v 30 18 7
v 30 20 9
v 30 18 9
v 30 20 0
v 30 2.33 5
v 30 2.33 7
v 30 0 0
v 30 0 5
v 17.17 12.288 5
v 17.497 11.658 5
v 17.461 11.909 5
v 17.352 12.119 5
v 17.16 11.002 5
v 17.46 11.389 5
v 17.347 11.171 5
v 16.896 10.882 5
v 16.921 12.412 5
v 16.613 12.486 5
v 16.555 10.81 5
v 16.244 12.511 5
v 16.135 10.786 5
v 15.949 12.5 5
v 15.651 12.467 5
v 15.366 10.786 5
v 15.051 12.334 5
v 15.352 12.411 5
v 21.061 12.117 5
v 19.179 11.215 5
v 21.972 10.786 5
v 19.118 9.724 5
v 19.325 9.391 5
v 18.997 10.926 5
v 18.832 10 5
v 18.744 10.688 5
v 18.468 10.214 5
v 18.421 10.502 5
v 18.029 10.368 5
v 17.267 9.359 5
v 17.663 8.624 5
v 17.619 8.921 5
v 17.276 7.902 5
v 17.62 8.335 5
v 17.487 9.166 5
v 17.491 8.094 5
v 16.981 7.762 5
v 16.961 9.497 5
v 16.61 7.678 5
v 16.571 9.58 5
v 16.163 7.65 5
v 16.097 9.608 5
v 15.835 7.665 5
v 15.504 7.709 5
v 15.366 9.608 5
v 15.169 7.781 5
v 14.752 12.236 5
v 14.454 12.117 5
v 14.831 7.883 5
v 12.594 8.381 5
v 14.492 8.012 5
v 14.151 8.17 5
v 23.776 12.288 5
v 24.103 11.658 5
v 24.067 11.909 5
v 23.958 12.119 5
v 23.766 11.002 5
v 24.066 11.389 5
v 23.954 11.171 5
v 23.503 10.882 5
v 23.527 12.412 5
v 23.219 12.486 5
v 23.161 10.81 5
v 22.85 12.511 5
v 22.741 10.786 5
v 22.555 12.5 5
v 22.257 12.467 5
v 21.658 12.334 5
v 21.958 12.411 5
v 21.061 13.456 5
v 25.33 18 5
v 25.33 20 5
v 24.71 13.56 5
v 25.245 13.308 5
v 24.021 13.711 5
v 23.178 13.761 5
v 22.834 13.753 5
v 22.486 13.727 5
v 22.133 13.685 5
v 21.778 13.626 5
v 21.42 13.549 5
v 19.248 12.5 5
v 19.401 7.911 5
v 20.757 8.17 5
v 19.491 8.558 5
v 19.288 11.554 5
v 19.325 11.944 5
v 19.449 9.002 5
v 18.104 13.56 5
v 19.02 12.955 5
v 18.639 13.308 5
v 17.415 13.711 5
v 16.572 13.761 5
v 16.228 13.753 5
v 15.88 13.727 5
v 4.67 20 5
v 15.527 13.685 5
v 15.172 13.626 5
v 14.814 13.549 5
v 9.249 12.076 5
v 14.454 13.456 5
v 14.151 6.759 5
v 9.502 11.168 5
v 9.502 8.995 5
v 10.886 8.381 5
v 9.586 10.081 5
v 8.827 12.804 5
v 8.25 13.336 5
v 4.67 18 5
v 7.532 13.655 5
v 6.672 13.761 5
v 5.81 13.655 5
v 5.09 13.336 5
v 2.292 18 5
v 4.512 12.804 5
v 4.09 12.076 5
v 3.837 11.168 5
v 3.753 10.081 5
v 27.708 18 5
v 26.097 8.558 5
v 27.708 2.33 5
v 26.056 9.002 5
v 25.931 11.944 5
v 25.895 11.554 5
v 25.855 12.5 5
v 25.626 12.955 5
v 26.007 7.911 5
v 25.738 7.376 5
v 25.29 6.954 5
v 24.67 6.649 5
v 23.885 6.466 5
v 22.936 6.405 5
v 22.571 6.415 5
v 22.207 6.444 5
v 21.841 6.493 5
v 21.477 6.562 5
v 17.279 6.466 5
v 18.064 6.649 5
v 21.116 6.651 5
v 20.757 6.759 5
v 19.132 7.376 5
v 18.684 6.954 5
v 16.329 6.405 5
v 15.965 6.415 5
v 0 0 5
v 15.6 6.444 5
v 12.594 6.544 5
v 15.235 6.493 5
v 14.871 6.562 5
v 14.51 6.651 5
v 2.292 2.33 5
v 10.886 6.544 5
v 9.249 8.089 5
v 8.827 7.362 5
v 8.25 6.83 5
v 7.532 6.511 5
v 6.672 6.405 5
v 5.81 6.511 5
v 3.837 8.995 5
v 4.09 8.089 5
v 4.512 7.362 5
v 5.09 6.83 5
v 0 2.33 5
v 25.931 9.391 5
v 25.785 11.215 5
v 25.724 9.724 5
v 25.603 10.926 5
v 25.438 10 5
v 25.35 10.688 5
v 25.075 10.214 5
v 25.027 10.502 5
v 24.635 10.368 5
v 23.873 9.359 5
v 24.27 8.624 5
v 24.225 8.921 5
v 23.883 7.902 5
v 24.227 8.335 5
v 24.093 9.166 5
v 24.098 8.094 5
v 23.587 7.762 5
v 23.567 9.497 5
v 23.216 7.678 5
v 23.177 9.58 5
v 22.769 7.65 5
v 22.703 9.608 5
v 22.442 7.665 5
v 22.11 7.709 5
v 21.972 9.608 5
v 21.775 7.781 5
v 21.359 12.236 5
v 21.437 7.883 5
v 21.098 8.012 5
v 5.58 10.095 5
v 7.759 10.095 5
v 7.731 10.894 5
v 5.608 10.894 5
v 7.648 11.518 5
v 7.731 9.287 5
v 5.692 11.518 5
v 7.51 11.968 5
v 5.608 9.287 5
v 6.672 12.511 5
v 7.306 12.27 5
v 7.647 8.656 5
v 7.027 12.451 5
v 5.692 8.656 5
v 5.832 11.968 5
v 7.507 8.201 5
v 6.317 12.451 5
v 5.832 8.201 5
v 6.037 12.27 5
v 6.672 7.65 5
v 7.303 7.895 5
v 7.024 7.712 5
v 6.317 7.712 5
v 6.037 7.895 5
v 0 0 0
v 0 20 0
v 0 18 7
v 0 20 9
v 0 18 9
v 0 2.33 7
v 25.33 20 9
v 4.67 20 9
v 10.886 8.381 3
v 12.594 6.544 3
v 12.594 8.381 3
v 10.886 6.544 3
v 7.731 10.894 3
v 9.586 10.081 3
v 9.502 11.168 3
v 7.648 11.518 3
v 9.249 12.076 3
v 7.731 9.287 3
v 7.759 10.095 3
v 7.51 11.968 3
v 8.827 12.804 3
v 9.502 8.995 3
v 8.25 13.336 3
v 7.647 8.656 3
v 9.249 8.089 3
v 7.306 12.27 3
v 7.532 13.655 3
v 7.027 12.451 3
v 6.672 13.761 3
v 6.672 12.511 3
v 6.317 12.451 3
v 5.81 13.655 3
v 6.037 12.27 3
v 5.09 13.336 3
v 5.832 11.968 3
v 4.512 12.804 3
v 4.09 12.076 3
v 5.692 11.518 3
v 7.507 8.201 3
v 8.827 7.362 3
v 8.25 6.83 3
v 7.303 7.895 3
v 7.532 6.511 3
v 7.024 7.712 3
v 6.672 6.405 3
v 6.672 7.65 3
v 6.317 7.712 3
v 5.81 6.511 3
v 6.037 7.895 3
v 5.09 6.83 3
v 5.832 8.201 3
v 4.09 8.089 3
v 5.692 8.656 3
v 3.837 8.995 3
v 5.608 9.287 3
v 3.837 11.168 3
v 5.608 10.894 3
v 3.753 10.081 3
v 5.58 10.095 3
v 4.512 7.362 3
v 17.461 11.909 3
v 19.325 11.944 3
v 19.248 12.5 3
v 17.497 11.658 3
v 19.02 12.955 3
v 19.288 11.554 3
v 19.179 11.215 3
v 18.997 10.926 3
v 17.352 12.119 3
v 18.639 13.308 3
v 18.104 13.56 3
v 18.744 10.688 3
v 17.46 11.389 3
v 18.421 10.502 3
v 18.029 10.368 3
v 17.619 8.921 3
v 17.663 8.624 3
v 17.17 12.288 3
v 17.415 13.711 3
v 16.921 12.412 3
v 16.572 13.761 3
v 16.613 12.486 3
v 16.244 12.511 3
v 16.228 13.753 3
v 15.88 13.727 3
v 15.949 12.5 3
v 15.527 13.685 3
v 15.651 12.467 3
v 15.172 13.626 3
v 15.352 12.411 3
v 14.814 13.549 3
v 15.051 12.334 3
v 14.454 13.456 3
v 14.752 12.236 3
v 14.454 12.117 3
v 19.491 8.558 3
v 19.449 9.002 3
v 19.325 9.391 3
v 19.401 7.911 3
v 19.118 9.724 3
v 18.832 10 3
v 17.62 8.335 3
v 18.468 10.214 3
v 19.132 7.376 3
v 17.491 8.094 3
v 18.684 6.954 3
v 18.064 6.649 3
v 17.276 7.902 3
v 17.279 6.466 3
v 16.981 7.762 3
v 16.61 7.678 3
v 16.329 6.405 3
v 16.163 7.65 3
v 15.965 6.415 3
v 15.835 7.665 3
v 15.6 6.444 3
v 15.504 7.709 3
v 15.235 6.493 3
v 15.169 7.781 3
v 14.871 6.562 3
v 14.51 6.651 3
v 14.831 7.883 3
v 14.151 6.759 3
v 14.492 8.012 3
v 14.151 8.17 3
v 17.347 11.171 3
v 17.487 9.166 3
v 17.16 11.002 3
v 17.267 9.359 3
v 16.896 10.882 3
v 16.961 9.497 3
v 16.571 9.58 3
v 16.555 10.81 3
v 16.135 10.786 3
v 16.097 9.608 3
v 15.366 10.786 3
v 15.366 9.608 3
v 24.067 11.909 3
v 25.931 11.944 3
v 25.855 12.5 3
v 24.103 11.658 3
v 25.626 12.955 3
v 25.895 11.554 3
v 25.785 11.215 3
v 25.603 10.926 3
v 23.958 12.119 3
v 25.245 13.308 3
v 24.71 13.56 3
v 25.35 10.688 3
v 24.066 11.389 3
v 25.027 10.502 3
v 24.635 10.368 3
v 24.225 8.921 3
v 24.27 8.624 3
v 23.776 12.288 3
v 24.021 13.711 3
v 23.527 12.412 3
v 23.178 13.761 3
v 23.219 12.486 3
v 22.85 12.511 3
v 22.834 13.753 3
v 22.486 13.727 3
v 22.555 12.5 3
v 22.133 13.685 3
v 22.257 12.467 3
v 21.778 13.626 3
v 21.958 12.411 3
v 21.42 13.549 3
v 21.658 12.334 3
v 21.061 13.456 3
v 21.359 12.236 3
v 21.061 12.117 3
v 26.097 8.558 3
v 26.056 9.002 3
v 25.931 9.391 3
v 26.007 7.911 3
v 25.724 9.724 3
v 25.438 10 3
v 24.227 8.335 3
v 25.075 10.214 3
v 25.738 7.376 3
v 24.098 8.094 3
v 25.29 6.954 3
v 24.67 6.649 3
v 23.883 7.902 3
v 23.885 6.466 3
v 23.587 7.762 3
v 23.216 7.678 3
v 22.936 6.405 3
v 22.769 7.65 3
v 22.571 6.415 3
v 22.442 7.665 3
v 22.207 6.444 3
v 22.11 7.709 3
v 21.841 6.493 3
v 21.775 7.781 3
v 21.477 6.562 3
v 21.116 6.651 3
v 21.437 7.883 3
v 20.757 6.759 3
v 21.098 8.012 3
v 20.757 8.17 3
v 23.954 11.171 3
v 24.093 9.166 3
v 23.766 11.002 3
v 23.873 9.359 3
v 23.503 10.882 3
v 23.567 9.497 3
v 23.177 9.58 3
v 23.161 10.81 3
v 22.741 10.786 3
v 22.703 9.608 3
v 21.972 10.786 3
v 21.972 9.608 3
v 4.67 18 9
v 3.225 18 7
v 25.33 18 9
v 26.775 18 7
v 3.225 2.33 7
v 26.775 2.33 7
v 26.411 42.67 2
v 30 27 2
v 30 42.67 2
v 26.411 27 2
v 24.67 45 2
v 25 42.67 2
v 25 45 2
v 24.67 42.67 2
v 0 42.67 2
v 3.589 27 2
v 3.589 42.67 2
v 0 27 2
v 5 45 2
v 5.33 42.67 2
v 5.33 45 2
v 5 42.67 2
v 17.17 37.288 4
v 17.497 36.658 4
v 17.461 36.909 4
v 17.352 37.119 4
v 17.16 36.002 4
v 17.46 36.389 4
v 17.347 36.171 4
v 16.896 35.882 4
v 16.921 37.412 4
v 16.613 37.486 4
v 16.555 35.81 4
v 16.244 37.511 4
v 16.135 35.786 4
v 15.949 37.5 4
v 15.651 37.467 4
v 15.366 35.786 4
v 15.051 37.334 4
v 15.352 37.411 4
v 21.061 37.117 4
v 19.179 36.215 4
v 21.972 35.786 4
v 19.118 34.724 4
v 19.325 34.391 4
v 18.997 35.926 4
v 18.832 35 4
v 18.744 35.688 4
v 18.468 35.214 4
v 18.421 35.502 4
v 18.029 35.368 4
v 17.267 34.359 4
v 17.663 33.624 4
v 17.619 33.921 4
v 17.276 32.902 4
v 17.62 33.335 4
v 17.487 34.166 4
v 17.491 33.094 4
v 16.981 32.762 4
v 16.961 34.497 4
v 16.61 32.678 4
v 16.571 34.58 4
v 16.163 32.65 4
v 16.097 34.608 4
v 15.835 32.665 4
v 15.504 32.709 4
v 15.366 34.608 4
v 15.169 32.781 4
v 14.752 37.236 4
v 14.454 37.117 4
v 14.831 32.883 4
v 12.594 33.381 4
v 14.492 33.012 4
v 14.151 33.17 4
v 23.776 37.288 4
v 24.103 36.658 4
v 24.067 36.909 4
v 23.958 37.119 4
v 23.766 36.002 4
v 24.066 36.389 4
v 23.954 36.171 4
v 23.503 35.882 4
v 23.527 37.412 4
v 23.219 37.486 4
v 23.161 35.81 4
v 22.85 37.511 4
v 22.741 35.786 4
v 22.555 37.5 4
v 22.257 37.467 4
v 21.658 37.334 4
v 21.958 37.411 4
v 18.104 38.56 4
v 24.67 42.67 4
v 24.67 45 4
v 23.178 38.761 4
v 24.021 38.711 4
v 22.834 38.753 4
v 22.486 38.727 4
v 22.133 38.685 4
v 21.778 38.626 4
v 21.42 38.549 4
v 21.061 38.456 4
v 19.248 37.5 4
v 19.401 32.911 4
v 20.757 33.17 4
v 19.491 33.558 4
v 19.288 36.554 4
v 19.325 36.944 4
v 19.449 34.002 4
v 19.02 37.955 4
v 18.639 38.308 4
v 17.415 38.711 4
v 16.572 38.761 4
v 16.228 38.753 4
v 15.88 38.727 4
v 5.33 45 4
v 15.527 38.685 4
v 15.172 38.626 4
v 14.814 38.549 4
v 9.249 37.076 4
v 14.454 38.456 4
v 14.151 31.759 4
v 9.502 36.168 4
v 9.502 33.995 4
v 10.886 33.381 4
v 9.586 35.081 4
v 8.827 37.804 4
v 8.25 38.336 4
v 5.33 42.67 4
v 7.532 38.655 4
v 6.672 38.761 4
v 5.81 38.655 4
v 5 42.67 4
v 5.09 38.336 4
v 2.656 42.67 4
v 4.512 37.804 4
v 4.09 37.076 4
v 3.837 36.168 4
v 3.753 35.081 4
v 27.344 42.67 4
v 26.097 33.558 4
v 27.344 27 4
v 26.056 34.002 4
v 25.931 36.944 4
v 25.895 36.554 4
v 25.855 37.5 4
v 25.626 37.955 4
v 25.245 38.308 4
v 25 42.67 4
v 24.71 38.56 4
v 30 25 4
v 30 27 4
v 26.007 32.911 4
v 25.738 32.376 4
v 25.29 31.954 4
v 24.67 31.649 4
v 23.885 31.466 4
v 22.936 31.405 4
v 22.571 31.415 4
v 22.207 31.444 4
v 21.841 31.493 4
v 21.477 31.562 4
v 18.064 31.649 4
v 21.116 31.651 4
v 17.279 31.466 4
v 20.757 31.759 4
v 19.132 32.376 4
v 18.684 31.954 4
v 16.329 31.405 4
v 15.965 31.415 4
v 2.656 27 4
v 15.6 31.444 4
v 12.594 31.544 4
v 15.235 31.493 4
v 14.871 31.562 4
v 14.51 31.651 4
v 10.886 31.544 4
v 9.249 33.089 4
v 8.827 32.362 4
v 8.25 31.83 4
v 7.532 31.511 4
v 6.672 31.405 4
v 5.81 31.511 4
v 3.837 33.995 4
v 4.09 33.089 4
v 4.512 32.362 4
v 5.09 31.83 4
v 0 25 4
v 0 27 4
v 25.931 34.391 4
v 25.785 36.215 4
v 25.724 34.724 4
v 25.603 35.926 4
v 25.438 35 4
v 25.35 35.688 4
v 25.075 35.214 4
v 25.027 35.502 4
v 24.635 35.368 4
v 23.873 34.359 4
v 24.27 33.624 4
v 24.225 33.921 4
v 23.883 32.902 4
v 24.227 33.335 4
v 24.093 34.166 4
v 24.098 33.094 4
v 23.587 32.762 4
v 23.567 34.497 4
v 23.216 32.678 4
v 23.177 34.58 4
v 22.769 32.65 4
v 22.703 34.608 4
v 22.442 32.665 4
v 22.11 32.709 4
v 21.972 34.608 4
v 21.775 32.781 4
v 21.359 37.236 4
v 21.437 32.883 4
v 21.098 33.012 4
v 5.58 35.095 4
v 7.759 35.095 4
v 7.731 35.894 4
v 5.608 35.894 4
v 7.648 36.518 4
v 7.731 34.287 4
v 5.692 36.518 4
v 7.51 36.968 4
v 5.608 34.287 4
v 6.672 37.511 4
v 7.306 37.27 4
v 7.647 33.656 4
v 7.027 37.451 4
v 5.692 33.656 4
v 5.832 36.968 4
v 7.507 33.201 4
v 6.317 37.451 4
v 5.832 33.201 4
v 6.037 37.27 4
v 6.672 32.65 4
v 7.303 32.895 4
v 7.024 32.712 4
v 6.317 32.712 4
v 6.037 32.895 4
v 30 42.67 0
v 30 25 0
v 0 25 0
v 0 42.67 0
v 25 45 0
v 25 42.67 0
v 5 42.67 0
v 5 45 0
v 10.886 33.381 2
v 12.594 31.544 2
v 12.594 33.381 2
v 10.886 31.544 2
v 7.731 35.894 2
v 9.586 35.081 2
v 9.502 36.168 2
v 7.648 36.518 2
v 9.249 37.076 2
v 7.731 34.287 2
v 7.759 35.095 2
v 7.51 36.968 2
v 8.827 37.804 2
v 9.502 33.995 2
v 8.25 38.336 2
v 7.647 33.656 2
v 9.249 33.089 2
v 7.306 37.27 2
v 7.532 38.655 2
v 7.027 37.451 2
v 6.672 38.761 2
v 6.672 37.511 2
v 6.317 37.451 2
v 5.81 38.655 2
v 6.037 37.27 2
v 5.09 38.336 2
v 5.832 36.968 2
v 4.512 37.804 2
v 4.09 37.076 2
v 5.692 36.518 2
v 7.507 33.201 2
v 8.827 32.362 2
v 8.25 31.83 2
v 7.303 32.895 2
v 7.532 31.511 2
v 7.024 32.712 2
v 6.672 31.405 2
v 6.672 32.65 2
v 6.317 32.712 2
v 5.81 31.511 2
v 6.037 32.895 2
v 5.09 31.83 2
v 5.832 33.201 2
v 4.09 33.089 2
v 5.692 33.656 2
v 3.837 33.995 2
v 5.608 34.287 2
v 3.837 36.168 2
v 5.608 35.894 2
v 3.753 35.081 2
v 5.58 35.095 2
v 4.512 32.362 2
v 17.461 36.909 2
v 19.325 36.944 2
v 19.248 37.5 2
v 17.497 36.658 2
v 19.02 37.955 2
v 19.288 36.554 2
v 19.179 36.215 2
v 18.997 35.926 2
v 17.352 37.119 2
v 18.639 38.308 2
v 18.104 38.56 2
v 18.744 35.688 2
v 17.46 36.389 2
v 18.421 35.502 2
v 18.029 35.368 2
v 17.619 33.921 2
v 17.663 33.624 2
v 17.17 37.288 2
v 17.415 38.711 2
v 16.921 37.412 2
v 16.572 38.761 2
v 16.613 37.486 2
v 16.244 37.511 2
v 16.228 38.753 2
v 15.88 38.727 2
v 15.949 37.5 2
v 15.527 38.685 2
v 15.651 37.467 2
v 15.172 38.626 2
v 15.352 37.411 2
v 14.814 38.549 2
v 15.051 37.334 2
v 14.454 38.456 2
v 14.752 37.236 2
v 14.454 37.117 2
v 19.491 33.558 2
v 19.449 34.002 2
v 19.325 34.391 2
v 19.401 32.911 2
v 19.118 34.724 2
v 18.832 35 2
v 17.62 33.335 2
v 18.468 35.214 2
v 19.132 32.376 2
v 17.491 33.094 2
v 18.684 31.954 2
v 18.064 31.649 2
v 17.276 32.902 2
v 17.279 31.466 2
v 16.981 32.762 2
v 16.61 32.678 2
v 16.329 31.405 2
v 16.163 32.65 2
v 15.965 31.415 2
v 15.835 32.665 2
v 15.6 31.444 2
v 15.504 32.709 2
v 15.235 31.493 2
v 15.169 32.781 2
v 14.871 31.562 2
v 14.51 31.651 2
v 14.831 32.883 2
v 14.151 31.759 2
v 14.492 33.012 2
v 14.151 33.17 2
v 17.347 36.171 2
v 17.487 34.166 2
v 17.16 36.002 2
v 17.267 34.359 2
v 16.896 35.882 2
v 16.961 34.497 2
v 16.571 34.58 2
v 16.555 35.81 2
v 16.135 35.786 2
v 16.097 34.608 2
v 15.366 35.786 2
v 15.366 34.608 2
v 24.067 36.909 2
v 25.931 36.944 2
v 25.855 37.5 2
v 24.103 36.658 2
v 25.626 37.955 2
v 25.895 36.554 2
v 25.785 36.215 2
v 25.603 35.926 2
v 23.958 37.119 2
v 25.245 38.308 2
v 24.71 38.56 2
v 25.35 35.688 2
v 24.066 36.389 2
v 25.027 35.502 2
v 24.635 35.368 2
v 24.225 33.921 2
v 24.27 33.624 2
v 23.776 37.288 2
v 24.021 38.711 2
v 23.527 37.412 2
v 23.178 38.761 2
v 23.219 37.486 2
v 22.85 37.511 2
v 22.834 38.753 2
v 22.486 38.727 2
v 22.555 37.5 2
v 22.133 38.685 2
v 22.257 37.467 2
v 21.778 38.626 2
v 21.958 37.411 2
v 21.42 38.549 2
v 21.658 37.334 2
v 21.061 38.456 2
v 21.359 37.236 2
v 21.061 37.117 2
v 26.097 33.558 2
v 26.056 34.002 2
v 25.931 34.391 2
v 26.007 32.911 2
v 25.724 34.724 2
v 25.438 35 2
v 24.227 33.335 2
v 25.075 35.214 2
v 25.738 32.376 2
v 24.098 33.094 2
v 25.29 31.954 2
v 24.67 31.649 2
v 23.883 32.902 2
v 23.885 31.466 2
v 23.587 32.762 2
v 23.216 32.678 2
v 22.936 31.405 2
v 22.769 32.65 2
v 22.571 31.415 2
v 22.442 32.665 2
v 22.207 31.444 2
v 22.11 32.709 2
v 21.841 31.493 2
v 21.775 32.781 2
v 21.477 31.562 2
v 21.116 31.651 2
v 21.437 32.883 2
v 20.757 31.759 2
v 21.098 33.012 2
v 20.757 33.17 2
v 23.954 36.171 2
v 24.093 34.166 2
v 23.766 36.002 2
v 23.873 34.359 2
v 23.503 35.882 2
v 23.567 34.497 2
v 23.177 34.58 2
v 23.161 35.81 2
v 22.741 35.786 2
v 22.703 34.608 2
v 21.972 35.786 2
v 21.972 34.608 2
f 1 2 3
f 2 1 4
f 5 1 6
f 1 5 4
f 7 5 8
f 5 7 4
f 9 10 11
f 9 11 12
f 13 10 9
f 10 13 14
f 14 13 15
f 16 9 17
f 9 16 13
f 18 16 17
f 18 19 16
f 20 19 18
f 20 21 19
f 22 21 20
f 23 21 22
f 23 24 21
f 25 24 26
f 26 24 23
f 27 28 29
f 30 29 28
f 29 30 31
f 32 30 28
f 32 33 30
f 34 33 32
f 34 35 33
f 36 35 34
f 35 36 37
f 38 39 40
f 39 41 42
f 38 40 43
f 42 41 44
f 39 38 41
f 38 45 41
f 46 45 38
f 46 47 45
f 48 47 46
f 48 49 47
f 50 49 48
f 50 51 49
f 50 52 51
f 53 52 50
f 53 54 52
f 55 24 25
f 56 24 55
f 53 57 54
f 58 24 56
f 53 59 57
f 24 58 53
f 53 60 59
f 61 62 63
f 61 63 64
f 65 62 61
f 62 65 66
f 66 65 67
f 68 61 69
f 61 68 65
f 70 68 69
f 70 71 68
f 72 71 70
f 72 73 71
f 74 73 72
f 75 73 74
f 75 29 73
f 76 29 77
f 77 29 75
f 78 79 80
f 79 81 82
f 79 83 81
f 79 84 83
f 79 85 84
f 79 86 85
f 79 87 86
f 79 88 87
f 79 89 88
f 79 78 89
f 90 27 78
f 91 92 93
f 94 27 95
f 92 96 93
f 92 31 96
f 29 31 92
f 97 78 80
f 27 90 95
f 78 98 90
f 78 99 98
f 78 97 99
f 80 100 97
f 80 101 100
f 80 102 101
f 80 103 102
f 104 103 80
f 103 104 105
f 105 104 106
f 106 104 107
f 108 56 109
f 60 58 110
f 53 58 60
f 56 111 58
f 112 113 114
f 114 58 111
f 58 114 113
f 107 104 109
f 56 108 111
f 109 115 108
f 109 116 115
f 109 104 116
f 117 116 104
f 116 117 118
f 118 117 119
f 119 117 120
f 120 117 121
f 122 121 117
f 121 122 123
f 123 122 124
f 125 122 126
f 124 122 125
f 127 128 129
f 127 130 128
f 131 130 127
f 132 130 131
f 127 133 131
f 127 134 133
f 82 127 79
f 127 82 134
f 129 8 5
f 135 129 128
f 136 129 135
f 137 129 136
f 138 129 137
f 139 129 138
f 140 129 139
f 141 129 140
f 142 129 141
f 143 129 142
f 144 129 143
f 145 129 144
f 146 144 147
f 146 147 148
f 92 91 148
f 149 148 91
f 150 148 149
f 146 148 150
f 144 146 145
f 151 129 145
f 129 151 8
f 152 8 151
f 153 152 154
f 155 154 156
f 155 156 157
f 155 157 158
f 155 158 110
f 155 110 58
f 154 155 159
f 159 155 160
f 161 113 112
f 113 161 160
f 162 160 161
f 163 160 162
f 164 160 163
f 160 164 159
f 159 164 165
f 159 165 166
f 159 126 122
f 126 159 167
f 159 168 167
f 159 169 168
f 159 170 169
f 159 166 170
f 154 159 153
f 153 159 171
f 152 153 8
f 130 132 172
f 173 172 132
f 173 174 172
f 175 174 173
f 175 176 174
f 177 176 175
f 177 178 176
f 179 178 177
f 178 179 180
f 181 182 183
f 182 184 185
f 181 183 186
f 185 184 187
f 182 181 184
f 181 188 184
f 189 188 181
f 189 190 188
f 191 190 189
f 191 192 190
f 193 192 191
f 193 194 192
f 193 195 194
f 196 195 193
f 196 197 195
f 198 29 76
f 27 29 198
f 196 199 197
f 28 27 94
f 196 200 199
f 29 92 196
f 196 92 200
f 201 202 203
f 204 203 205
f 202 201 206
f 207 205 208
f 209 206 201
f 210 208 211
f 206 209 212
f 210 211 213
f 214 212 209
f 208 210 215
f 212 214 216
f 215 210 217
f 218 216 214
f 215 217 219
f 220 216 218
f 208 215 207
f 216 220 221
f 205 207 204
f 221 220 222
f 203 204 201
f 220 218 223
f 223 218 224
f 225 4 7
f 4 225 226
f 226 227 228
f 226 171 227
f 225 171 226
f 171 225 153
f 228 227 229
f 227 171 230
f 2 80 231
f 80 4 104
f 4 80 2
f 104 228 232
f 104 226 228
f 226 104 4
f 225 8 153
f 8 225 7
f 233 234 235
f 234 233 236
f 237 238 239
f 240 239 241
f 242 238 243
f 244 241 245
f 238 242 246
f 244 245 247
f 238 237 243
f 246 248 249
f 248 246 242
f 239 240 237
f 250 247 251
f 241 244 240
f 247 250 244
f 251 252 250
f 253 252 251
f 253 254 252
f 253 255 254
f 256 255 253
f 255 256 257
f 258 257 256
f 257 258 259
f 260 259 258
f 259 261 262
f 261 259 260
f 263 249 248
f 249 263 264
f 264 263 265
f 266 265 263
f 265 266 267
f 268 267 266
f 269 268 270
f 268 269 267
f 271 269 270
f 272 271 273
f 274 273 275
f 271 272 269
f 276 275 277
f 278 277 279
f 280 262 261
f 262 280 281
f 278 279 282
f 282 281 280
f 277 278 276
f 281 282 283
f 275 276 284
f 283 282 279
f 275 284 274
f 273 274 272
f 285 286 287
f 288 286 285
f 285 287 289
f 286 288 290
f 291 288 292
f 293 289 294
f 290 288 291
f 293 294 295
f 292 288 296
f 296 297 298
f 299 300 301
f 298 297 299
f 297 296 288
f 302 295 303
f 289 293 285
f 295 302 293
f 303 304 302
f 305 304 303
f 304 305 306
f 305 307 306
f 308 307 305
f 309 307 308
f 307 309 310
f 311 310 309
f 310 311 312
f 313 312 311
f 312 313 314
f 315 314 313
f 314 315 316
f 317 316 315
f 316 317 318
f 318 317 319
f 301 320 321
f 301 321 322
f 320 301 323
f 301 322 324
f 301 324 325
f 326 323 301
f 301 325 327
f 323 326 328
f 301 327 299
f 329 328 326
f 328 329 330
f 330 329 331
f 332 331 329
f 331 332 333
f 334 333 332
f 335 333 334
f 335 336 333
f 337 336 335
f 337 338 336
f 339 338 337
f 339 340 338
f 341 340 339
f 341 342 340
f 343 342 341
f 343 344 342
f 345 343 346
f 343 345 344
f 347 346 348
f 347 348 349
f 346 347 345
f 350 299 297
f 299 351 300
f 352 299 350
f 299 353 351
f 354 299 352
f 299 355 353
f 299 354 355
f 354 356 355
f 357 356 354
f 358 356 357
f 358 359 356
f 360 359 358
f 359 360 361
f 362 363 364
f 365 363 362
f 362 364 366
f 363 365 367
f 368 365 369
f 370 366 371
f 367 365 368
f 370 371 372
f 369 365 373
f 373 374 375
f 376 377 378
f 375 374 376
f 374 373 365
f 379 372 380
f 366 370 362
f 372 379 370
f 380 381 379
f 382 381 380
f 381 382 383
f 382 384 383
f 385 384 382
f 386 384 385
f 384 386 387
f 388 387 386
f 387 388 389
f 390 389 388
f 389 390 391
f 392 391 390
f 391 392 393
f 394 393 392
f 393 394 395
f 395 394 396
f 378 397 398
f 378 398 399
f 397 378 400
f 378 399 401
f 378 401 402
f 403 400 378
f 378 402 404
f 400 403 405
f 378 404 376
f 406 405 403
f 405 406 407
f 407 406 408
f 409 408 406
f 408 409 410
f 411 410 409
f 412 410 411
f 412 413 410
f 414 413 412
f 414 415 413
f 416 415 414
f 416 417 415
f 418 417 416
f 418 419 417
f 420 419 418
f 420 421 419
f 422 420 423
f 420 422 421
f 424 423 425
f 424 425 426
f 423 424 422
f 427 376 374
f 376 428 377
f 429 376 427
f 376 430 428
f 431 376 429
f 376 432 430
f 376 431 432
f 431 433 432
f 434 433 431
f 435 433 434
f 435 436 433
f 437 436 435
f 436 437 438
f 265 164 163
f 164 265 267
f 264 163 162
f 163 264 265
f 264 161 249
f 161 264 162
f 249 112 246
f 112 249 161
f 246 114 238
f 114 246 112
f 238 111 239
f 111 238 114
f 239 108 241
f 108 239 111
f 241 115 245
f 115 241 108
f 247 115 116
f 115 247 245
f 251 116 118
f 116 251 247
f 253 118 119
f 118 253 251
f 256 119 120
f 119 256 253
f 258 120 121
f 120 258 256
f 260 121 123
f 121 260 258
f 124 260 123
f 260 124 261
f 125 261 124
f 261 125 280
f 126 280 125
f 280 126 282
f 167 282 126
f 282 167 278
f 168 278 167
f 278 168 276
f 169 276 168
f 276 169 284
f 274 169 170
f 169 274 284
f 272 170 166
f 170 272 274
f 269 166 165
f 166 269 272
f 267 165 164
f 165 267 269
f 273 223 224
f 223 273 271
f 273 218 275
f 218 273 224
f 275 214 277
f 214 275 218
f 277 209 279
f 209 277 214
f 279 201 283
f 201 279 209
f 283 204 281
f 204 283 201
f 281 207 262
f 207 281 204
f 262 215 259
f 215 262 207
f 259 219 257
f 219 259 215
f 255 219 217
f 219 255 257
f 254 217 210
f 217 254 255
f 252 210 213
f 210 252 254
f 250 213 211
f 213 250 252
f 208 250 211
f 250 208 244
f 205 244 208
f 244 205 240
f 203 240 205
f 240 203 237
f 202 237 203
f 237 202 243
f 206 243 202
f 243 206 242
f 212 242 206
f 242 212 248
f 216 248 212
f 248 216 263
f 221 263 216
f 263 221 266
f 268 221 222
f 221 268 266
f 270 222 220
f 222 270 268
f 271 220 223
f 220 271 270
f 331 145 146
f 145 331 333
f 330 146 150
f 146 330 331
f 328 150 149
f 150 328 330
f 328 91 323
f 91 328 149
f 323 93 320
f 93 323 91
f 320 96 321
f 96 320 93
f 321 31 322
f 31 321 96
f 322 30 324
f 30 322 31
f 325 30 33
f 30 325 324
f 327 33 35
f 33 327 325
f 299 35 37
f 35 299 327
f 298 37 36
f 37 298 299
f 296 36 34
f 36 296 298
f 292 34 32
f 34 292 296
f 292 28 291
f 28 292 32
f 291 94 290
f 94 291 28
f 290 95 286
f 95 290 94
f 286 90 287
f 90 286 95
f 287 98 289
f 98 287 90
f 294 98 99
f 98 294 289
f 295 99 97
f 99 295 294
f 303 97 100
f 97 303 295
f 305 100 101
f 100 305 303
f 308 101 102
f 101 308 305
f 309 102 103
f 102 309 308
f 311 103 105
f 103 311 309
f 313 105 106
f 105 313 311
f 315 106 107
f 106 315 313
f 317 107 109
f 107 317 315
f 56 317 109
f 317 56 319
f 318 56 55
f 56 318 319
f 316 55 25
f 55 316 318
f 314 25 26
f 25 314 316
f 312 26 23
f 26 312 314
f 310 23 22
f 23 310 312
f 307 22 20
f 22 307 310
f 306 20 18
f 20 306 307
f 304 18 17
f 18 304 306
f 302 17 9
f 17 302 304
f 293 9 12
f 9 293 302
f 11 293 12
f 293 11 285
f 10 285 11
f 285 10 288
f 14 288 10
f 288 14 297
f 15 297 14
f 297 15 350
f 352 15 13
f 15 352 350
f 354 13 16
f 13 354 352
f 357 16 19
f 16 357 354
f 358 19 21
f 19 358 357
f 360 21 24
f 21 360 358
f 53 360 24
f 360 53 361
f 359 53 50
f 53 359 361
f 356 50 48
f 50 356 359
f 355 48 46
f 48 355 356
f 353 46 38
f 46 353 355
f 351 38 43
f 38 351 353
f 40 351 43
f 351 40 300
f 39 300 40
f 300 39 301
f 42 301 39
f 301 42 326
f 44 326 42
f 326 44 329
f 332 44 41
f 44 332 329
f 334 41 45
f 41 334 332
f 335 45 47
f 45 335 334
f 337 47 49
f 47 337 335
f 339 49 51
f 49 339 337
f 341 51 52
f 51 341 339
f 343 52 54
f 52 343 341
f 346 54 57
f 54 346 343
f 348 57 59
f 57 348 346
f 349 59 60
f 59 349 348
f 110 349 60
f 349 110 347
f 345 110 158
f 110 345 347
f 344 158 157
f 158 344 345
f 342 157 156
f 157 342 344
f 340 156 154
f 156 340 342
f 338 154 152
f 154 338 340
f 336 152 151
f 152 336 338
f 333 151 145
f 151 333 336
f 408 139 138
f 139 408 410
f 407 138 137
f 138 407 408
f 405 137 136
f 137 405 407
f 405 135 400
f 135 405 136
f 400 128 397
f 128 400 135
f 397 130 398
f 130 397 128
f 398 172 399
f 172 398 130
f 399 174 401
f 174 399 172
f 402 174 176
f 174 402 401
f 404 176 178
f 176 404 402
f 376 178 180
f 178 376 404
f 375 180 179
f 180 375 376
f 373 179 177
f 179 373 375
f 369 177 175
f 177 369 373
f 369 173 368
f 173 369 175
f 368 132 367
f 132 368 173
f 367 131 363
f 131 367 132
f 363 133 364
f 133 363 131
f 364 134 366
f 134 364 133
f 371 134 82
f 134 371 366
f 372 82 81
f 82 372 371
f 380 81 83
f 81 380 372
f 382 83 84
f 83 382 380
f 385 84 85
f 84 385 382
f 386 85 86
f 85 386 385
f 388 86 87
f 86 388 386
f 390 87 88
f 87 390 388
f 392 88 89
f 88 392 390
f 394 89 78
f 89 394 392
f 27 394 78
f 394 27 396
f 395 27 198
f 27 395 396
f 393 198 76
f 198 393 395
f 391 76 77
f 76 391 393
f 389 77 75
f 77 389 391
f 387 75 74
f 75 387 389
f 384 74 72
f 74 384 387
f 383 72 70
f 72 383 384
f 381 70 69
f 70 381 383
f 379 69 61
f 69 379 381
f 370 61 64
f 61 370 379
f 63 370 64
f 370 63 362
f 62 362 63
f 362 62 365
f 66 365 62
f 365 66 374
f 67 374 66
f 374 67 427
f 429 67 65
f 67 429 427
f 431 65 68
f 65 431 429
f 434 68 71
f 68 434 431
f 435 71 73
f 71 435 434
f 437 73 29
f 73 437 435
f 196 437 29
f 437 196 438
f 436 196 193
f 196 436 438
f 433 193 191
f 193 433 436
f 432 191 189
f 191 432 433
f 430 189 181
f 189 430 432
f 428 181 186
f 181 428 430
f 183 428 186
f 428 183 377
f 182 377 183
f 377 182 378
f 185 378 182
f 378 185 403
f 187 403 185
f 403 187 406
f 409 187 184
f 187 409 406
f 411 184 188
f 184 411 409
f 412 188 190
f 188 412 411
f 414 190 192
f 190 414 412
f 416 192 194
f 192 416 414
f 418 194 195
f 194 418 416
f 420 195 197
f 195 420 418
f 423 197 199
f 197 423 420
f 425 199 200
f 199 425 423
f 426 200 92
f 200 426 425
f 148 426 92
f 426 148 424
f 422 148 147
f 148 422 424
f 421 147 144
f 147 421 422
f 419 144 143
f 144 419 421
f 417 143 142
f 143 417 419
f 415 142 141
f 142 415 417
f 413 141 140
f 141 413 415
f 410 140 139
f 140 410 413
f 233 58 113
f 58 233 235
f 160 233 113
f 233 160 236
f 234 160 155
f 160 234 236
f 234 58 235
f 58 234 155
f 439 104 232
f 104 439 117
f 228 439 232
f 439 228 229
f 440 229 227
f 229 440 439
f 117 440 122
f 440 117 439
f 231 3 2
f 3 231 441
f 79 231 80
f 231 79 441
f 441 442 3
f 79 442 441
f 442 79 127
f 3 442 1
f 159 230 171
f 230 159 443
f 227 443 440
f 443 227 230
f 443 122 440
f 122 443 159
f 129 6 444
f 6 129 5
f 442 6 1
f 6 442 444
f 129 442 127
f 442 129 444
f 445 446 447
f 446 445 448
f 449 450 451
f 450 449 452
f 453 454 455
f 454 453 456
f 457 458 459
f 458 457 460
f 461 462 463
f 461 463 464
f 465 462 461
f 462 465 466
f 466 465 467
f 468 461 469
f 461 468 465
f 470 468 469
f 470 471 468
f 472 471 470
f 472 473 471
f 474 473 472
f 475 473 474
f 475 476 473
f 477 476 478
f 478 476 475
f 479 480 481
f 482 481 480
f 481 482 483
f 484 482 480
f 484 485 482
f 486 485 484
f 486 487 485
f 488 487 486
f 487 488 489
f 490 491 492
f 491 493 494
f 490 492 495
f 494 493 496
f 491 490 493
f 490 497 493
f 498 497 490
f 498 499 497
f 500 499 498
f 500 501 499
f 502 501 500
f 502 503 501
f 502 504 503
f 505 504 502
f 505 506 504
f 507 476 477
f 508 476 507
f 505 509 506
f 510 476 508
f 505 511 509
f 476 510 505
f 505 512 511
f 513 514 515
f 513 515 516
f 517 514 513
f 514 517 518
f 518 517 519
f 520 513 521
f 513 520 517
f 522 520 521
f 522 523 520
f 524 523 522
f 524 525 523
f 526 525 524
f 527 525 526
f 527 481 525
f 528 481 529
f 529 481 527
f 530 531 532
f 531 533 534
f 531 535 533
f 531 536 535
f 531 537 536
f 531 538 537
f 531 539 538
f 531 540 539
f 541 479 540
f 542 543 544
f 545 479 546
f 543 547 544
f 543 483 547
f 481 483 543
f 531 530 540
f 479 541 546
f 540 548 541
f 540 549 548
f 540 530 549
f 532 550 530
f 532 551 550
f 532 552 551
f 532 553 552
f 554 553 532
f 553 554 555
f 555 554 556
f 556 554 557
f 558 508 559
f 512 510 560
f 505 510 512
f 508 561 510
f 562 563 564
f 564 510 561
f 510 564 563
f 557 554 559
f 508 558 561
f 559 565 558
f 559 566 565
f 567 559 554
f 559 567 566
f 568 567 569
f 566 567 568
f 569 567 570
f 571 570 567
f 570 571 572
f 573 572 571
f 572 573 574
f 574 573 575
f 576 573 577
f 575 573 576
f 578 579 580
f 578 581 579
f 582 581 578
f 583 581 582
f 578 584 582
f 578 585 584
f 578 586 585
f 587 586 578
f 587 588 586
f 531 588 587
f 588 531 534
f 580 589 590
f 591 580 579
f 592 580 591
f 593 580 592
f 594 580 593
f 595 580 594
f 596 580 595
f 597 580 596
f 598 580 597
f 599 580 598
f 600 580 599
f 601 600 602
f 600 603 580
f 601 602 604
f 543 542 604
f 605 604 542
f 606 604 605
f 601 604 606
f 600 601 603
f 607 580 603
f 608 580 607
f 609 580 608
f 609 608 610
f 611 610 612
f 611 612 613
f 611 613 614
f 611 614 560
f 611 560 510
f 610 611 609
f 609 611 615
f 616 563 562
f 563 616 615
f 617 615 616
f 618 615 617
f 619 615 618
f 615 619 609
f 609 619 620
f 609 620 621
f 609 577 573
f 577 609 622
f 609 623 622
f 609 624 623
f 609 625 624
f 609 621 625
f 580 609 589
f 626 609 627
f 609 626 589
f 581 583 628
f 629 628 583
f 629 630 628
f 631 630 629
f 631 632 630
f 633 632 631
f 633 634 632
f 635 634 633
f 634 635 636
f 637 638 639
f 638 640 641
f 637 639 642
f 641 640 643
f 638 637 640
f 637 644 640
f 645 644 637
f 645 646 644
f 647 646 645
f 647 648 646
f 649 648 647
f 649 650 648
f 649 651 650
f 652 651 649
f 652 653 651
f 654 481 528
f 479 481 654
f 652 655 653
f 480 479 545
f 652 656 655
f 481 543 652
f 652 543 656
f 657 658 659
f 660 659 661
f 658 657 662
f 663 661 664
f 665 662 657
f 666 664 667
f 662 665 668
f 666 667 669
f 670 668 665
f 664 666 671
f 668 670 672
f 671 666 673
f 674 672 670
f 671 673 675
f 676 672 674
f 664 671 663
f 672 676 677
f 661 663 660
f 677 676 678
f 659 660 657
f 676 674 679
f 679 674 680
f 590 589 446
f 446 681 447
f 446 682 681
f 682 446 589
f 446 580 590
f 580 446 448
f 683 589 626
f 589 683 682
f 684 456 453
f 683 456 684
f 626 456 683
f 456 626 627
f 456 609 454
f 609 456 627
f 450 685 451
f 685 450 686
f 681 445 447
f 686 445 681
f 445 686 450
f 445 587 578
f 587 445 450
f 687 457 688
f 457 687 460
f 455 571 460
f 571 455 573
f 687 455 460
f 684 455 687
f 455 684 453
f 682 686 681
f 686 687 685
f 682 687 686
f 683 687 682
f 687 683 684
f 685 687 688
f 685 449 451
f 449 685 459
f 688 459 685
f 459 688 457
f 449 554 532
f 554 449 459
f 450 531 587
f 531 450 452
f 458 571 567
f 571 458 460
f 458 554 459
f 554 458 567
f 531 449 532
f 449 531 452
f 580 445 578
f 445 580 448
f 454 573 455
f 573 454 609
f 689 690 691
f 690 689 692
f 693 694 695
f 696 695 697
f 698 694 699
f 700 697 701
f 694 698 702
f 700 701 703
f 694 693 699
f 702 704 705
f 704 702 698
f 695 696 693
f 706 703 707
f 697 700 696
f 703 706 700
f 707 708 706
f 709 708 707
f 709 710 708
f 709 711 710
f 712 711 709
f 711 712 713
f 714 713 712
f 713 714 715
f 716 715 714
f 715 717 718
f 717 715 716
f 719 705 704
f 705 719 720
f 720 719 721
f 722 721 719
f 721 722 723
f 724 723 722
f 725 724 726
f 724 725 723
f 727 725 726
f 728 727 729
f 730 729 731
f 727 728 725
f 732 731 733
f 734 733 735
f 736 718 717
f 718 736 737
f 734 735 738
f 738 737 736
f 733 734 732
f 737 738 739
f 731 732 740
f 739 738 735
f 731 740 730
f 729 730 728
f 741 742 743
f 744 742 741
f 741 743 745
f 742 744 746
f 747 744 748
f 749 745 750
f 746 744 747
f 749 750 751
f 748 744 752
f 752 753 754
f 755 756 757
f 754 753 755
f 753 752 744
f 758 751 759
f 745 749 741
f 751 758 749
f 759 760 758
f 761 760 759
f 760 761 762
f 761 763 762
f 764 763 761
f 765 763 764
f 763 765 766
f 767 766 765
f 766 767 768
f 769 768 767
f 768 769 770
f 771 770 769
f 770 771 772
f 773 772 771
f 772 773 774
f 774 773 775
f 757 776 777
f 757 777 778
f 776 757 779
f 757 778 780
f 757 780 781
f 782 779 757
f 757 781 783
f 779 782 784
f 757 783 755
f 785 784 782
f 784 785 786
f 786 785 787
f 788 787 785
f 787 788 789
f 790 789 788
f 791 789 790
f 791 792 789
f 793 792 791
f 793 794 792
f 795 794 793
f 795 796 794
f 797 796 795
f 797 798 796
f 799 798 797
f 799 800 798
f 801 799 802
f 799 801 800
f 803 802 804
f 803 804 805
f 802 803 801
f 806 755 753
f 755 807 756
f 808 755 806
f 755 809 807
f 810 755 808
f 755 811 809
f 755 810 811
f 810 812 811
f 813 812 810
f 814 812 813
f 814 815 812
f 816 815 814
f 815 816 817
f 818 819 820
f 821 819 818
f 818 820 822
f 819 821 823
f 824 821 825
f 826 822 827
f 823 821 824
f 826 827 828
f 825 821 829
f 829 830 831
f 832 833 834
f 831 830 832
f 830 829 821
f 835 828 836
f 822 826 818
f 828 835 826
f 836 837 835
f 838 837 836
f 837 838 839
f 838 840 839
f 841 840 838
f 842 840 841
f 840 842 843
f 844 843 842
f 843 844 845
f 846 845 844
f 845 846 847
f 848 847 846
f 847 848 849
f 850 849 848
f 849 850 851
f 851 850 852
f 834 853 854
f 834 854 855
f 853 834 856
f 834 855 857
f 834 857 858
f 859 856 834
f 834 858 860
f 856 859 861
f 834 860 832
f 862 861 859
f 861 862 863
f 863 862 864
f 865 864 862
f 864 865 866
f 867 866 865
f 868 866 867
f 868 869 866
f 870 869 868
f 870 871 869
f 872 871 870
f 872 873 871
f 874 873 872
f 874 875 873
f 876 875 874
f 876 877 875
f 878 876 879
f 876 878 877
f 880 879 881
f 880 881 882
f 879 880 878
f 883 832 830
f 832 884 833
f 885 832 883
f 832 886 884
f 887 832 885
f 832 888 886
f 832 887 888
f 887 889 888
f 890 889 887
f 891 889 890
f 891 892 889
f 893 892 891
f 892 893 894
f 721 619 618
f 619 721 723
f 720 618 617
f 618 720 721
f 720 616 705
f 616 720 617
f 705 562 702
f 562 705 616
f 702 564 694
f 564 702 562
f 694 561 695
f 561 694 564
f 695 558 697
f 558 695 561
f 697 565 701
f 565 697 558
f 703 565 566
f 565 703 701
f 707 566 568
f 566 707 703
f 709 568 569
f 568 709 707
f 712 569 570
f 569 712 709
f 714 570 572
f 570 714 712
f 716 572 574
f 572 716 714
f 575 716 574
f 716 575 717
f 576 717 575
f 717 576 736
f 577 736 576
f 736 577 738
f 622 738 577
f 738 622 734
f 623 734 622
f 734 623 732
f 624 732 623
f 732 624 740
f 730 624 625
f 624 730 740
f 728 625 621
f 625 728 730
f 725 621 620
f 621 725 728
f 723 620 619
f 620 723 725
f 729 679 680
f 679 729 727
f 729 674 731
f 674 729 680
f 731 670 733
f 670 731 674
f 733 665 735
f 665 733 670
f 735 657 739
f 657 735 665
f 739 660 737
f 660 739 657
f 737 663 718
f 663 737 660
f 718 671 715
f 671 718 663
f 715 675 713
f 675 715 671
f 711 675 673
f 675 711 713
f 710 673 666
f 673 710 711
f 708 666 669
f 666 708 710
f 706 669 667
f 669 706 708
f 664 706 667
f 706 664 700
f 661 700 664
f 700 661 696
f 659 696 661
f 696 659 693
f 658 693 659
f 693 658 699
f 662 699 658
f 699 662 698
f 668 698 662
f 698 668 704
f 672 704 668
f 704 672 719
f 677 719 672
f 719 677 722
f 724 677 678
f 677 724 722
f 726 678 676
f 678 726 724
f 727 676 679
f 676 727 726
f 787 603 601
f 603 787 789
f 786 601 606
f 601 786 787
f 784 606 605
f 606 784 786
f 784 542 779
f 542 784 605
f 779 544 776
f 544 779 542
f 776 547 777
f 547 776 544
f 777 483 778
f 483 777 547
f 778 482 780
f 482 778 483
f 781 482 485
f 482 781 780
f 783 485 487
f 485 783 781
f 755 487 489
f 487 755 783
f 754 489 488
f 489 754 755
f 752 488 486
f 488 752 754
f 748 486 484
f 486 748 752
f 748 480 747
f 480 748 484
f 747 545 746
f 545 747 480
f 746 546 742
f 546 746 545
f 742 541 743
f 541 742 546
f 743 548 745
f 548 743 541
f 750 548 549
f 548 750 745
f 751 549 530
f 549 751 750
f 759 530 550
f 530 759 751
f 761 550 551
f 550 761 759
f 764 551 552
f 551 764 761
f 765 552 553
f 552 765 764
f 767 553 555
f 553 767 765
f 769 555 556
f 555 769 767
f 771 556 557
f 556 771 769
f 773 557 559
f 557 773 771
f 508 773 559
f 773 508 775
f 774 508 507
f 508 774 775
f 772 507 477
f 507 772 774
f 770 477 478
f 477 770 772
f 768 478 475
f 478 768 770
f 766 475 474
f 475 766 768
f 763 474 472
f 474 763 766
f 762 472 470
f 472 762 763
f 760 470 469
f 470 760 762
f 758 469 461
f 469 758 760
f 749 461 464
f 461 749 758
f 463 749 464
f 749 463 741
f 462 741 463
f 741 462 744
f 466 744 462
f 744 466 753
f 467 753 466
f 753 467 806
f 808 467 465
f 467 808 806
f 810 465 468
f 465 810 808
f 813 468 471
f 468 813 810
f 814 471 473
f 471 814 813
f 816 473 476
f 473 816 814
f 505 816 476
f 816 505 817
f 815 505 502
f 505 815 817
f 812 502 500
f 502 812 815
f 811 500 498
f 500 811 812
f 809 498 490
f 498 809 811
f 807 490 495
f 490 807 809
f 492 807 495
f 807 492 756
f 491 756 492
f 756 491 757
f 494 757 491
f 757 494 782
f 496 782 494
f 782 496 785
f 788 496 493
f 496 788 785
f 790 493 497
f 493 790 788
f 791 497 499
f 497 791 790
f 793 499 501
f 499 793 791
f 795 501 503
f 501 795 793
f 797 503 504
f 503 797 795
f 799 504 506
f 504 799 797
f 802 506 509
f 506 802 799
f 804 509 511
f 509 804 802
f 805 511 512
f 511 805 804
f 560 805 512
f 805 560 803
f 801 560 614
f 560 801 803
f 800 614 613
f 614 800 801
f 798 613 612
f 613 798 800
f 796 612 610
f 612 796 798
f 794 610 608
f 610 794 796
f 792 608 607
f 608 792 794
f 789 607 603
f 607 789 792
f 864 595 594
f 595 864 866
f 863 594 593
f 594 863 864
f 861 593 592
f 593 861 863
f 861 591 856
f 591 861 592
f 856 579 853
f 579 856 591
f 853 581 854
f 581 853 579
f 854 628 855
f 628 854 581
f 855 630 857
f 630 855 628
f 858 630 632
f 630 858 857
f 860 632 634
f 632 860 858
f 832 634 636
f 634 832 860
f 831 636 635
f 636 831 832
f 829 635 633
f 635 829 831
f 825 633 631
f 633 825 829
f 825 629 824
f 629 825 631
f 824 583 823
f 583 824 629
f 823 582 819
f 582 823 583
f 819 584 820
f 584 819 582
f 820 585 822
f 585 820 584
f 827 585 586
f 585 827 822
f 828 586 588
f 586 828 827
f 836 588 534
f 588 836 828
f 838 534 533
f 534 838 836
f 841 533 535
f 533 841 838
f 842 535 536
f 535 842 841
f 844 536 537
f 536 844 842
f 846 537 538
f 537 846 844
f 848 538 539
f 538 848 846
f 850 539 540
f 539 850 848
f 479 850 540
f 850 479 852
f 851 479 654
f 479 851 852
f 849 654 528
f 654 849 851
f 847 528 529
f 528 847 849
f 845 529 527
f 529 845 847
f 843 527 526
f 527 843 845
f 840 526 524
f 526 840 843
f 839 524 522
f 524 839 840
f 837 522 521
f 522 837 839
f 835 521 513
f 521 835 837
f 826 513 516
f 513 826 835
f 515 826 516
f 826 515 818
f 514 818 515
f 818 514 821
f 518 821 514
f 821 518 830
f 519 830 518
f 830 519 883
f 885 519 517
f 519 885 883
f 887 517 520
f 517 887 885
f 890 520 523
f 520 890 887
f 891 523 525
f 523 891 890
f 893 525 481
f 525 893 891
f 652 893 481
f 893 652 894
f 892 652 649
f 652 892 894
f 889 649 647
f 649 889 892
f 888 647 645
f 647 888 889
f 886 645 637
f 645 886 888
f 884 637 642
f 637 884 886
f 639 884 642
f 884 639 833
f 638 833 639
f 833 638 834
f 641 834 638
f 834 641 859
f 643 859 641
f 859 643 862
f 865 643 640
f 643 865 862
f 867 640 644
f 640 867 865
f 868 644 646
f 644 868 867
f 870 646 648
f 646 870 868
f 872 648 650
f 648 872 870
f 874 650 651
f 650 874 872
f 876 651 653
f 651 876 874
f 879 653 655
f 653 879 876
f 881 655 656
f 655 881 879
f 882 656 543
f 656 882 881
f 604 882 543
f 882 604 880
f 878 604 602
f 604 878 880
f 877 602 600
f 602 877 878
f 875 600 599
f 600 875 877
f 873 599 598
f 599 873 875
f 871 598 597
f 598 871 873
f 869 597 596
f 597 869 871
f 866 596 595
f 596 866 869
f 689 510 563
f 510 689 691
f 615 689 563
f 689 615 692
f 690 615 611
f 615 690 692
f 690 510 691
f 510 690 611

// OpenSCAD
// doaks-slides
// An OpenSCAD library to create slides.
// = sliding rails, saddles, and trays =

// © 2021 Daniel Oakley
// This work is licensed under the Creative Commons
// Attribution-ShareAlike 4.0 International License.
// To view a copy of this license, visit
// http://creativecommons.org/licenses/by-sa/4.0/.

// default tolerance in mm.
// I found this works well on my printer with a .3mm nozzle,
// hopefully it works on yours too!  ¯\_(ツ)_/¯
default_slides_tolerance = .33;

// helper function
module copy_mirror(vec=[0,0,0], offset=[0,0,0])
{
    children();
    translate(offset) mirror(vec) children();
}

// this creates a dovetail slide with a tray on top.
// add geometry underneath this to hold up the outer rails.
//
// the pieces look like this:
//
//     ┌─────────────────┐
//     │                 │  <- sliding tray
//     └──             ──┘      (inner)
//       /_____________\
//
//     ┌──             ──┐  <- static base
//     │_/             \_│      (outer)
//
// size is the overall 'bounding box' of the slide, including the tray's height.
// cols are how wide and high the 'rail sections' on either side are.
// cap is the width of the 'cap' at either end of the slide (0 for none).
// angle is the angle of the dovetail (0 is vertical).
// tolerance is the tolerance between rails/tray and caps/fills.
// inner is whether we're rendering the inner or the outer segment of the slide.
module reverse_dovetail_slide(size=[30,10,4], cols=[5,2], cap=0, angle=25, tolerance=default_slides_tolerance, inner=false)
{
    if (inner) {
        // space between the cols
        captolerance = cap == 0 ? 0 : tolerance;
        translate([cols[0],0,0]) cube([size[0]-cols[0]*2,size[1]-cap-captolerance,cols[1]]);
        translate([cols[0]+tolerance,size[1]-cap-captolerance,0]) cube([size[0]-cols[0]*2-tolerance*2,cap+captolerance,cols[1]]);
        
        // front cap
        if (cap != 0) copy_mirror([1,0,0], [size[0],0,0]) cube([cols[0],cap,cols[1]]);
        
        // top plate
        difference() {
            // main plate
            translate([0,0,cols[1]]) cube([size[0],size[1],size[2]-cols[1]]);

            // cut away back cap
            if (cap != 0) copy_mirror([1,0,0], [size[0],0,0]) translate([-1,size[1]-cap-tolerance,1]) cube([cols[0]+1,cap+1,size[2]+1]);
        }
    } else {
        // back cap
        if (cap != -1) copy_mirror([1,0,0], [size[0],0,0]) translate([0,size[1]-cap,0]) cube([cols[0]-tolerance,cap,size[2]]);
    }

    // main columns
    copy_mirror([1,0,0], [size[0],0,0]) difference() {
        // left col
        cube([cols[0],size[1],cols[1]]);

        // main angled cut away
        modifyx = inner ? -cols[0]/2 + tolerance : cols[0]/2;
        newh = cols[1]*5; // expanded height so we can diff this from the actual rail without running out of room, even @ extreme angles
        translate([0,size[1]+1,cols[1]/2]) rotate([0,angle,0]) translate([modifyx,0,-newh/2]) rotate([90,0,0]) linear_extrude(size[1]+2) resize([cols[0],newh]) polygon([[0,0],[0,1],[1,1],[1,0]]);

        if (cap != 0) {
            if (inner) {
                // cut away back cap
                copy_mirror([1,0,0], [size[0],0,0]) translate([-1,size[1]-cap-tolerance,-1]) cube([(cols[0]+1)+1,cap+1+tolerance,size[2]+1]);
            } else {
                // cut away front cap
                copy_mirror([1,0,0], [size[0],0,0]) translate([-1,-1,-1]) cube([cols[0]+1,cap+1+tolerance,size[2]+1]);
            }
        }
    }
}

// this creates a 3d printable test reverse dovetail slide,
// with indented text saying the tolerance in mm
module test_reverse_dovetail_slide(tolerance=default_slides_tolerance)
{
    // bottom (static) segment
    difference() {
        cube([30,20,5]);
        translate([15,10,3]) linear_extrude(3) text(str(tolerance), size=7, font="Liberation Sans Mono:style=Bold", halign="center", valign="center");
    }
    translate([0,0,5]) reverse_dovetail_slide([30,20,4], cap=2, tolerance=tolerance);

    // top (sliding) segment
    difference() {
        translate([30,25,4]) rotate([0,180,0]) reverse_dovetail_slide([30,20,4], cap=2, tolerance=tolerance, inner=true);
        translate([15,35,2]) linear_extrude(3) text(str(tolerance), size=7, font="Liberation Sans Mono:style=Bold", halign="center", valign="center");
    }
}

test_reverse_dovetail_slide();
